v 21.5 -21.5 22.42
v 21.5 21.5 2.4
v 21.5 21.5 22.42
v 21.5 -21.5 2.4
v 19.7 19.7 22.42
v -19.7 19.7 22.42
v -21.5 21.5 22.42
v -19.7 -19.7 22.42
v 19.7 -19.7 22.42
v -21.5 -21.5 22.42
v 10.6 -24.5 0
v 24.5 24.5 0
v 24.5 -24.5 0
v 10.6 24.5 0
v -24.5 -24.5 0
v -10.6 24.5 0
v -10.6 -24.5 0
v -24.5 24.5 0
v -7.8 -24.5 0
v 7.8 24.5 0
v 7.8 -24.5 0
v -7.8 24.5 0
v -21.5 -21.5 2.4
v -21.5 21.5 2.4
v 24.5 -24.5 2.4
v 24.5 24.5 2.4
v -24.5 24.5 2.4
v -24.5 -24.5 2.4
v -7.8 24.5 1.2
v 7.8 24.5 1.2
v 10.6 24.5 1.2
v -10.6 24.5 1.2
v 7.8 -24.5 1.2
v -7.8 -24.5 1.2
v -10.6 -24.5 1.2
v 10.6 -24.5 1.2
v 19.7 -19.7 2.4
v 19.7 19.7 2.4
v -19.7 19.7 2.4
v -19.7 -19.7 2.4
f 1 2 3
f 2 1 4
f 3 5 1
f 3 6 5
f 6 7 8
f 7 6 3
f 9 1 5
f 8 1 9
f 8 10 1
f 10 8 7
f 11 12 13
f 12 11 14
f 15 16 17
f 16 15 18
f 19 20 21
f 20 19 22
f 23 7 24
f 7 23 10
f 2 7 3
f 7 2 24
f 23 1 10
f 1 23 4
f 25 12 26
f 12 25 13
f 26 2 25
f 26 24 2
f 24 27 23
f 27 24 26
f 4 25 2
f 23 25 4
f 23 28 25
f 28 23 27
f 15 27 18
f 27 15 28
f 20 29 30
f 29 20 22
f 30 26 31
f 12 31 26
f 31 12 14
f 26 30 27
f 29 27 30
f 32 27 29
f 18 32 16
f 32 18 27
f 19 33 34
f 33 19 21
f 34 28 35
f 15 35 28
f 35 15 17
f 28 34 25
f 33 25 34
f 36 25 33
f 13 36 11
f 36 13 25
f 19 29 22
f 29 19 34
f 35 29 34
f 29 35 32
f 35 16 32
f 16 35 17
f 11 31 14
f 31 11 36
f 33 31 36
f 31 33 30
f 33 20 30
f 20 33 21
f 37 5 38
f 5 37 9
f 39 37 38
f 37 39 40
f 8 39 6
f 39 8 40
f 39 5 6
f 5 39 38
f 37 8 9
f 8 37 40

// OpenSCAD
// -*- mode: SCAD ; c-file-style: "ellemtel" ; coding: utf-8 -*-
//
// A simple “coaster” to stop condiment bottles from falling over when
// placed on the bars of a the grid in the fridge
//
// © 2018 Roland Sieker <ospalh@gmail.com>
// Licence: CC-BY-SA 4.0


// Distance from one bar of the fridge shelf grid to the next. All sizes are in millimetres.
bar_spacing = 18.4;  // [5:0.1:30]
// Diameter of one shelf grid bar
bar_width = 2.8;  // [0.5:0.1:7]
// Height of the coaster pot.
pot_height = 20;  // [3:0.5:50]

// Breadth (x direction size) of the bottle to hold
x_width = 39;  // [10:0.1:80]

// Depth (y direction size) of the bottle to hold
y_width = 39;  // [10:0.1:80]

// Width of the flange. How much the bottom is wider than the pot on top.
flange = 3;  // [0:0.5:15]


/* [Hidden] */

// Done with the customizer

preview = 0; // [0:render, 1:preview]
// Kept, but not used


// *******************************************************
// Extra parameters. These can be changed reasonably safely.


w = 1.8;  // Wall width
p = 1.2;  // Bottom, top plate height
c = 0.4;  // Clearance
angle = 60; // Overhangs much below 60° are a problem for me

// *******************************************************
// Some shortcuts. These shouldn’t be changed

tau = 2 * PI;  // π is still wrong. τ = ⌀ ÷ r

xy_factor = 1/tan(angle);
// To get from a height to a horizontal width inclined correctly
z_factor = tan(angle);  // The other way around


xw = x_width + c;
yw = y_width + c;
xww = xw + 2*w;
yww = yw + 2*w;

some_distance = 50;
ms = 0.01;  // Muggeseggele.

// fn for differently sized objects and fs, fa; all for preview or rendering.
pna = 40;
pnb = 15;
pa = 5;
ps = 1;
rna = 180;
rnb = 30;
ra = 1;
rs = 0.1;
function na() = (preview) ? pna : rna;
function nb() = (preview) ? pnb : rnb;
$fs = (preview) ? ps : rs;
$fa = (preview) ? pa : ra;

// *******************************************************
// End setup



// *******************************************************
// Generate the parts

fridge_coaster();

// *******************************************************
// Code for the parts themselves


module fridge_coaster()
{

   hrc = ceil((xw+w+bar_width+flange)/bar_spacing) + 1;
   difference()
   {
      union()
      {
         translate([0,0,p+pot_height/2+ms])
         {
            cube([xww, yww, 2*p+pot_height+2*ms], center=true);
         }
         translate([0,0,p])
         {
            cube([xww+2*flange, yww+2*flange, 2*p], center=true);
         }
      }
      translate([0,0,2*p])
      {
         translate([0,0,p+pot_height/2+ms])
         {
            cube([xw, yw, 2*p+pot_height+2*ms], center=true);
         }
      }
      for (o=[-hrc:hrc])
      {
         echo(o);
         translate([(o+0.5)*bar_spacing,0, 0])
         {
            cube([bar_width, yww + 2*(c+bar_width+flange+ms), 2*p], center=true);
         }
      }
   }
}
